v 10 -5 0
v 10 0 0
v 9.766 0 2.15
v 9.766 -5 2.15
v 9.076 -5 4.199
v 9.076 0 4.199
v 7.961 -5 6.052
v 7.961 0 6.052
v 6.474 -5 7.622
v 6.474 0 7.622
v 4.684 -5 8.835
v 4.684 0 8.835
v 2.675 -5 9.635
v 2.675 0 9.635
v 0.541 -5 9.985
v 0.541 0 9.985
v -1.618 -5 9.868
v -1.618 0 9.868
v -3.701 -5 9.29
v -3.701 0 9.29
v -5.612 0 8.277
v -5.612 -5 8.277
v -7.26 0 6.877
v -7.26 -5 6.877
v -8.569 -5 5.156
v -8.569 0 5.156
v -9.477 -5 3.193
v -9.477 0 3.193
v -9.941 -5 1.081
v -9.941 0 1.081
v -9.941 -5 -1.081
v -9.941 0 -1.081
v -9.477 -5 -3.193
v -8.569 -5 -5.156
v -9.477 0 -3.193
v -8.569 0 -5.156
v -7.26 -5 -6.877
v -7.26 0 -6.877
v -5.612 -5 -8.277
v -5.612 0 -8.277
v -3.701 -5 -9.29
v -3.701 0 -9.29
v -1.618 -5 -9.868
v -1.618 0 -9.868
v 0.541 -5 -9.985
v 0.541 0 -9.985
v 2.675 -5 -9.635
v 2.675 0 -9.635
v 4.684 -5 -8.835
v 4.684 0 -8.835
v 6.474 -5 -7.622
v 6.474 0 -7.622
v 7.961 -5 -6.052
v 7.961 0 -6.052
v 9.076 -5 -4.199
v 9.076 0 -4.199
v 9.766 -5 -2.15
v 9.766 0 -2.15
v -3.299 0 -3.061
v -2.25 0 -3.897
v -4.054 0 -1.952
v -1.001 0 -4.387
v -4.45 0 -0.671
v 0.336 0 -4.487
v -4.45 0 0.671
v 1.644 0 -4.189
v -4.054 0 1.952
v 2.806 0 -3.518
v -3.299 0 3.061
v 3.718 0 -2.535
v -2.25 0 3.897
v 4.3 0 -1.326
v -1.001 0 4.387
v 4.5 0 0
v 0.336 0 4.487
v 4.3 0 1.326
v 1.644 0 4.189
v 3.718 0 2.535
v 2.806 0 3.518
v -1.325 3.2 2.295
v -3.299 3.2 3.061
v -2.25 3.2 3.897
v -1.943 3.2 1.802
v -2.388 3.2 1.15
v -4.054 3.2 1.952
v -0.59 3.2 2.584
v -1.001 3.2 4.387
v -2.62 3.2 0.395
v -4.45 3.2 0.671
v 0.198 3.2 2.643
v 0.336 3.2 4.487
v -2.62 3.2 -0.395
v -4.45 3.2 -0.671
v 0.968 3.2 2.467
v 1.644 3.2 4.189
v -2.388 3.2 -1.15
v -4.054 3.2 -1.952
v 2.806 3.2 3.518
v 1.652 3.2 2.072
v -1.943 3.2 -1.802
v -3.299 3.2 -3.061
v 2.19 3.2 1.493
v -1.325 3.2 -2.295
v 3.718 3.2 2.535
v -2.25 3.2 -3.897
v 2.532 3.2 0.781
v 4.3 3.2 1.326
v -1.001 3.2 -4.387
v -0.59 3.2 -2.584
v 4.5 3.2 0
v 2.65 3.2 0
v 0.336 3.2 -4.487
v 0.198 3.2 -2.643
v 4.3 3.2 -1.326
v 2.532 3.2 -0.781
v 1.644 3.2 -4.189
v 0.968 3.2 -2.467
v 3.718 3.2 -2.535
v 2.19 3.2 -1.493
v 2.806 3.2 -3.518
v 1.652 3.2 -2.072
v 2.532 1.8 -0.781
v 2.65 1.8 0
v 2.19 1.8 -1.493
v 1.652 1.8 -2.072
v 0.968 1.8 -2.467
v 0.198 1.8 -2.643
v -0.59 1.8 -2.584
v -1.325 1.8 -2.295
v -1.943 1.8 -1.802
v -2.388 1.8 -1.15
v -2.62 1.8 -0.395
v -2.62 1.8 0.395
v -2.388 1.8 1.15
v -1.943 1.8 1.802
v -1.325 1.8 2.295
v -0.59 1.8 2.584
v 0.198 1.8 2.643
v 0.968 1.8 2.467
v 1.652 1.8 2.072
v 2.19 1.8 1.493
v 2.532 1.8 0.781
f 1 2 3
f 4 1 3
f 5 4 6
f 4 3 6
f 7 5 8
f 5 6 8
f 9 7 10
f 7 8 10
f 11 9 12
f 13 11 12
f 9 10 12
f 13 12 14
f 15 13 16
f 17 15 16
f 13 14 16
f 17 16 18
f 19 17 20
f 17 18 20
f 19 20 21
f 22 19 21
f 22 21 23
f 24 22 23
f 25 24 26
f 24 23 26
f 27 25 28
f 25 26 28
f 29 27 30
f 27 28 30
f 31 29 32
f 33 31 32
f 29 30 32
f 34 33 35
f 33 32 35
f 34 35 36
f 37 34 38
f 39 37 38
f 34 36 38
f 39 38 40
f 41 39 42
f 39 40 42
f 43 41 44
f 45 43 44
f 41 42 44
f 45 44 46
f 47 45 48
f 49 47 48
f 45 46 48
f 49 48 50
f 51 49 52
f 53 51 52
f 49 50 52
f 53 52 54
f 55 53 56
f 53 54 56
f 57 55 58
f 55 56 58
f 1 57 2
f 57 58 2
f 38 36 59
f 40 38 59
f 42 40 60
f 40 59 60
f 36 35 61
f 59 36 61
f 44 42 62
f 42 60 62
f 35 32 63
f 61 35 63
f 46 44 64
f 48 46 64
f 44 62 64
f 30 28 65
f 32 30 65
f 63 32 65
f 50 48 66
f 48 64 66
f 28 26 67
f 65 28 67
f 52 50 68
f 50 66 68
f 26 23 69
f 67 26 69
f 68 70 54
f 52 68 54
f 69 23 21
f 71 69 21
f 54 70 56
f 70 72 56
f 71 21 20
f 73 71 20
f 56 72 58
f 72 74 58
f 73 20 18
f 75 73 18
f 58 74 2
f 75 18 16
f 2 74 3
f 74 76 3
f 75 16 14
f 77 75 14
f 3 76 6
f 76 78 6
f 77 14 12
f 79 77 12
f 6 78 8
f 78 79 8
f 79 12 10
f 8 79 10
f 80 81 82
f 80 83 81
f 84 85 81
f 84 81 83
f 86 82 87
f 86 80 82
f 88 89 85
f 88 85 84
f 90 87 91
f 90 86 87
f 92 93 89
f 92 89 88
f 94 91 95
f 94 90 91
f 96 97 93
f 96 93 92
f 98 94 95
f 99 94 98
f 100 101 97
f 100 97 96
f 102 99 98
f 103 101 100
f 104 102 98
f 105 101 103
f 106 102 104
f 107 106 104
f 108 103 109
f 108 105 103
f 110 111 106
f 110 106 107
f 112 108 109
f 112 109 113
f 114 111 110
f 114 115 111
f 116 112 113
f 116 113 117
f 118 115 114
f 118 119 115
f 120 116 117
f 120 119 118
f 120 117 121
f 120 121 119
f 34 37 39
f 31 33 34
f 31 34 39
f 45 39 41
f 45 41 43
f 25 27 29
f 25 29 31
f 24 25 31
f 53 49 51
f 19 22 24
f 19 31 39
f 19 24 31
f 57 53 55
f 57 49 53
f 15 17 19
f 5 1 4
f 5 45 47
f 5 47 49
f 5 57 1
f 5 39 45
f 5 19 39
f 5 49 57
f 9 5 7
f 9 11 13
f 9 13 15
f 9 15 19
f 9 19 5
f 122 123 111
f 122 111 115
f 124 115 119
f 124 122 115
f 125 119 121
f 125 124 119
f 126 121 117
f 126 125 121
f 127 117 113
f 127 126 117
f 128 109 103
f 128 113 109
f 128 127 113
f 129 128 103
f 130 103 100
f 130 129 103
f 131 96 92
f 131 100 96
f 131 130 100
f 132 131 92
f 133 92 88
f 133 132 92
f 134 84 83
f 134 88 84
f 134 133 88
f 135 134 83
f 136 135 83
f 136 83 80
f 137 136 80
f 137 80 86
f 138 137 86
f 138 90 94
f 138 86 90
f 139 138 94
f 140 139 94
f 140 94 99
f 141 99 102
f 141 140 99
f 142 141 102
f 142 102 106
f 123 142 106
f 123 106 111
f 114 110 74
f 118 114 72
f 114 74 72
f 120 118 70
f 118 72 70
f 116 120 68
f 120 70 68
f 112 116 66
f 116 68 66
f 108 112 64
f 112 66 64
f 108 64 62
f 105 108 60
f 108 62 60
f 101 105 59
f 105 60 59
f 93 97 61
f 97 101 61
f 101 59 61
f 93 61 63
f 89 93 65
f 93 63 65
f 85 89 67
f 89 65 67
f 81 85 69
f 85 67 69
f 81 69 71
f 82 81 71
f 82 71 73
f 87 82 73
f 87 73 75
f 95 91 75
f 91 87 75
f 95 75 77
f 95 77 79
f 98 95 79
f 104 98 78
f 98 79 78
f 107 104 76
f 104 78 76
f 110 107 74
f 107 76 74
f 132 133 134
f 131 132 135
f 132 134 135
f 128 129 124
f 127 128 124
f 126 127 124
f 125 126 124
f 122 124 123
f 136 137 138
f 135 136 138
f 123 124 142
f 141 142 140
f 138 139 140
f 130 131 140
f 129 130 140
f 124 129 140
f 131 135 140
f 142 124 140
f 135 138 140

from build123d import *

# Parameters (mm, degrees)
SKETCH1_R           = 4.5
SKETCH1_R_2         = 2.65
BOSS_EXTRUDE1_DEPTH = 3.8
SKETCH2_R           = 2.65
BOSS_EXTRUDE2_DEPTH = 1.8
SKETCH3_R           = 10
BOSS_EXTRUDE3_DEPTH = 5
SKETCH4_R           = 6.809110127
CUT_EXTRUDE1_DEPTH  = 0.6


with BuildPart() as part:
    # Sketch1 → Boss-Extrude1 (new body)
    with BuildSketch(Plane(origin=(0, 0, 0), x_dir=(1, 0, 0), z_dir=(0, 1, 0))):
        Circle(SKETCH1_R)
        Circle(SKETCH1_R_2, mode=Mode.SUBTRACT)
    extrude(amount=BOSS_EXTRUDE1_DEPTH)

    # Sketch2 → Boss-Extrude2 (add)
    with BuildSketch(Plane.XZ):
        Circle(SKETCH2_R)
    extrude(amount=-BOSS_EXTRUDE2_DEPTH)

    # Sketch3 → Boss-Extrude3 (add)
    with BuildSketch(Plane.XZ):
        Circle(SKETCH3_R)
    extrude(amount=BOSS_EXTRUDE3_DEPTH)

    # Sketch4 → Cut-Extrude1 (cut)
    with BuildSketch(Plane(origin=(0, 3.8, 0), x_dir=(1, 0, 0), z_dir=(0, 1, 0))):
        Circle(SKETCH4_R)
    extrude(amount=-CUT_EXTRUDE1_DEPTH, mode=Mode.SUBTRACT)


solid = part.part
